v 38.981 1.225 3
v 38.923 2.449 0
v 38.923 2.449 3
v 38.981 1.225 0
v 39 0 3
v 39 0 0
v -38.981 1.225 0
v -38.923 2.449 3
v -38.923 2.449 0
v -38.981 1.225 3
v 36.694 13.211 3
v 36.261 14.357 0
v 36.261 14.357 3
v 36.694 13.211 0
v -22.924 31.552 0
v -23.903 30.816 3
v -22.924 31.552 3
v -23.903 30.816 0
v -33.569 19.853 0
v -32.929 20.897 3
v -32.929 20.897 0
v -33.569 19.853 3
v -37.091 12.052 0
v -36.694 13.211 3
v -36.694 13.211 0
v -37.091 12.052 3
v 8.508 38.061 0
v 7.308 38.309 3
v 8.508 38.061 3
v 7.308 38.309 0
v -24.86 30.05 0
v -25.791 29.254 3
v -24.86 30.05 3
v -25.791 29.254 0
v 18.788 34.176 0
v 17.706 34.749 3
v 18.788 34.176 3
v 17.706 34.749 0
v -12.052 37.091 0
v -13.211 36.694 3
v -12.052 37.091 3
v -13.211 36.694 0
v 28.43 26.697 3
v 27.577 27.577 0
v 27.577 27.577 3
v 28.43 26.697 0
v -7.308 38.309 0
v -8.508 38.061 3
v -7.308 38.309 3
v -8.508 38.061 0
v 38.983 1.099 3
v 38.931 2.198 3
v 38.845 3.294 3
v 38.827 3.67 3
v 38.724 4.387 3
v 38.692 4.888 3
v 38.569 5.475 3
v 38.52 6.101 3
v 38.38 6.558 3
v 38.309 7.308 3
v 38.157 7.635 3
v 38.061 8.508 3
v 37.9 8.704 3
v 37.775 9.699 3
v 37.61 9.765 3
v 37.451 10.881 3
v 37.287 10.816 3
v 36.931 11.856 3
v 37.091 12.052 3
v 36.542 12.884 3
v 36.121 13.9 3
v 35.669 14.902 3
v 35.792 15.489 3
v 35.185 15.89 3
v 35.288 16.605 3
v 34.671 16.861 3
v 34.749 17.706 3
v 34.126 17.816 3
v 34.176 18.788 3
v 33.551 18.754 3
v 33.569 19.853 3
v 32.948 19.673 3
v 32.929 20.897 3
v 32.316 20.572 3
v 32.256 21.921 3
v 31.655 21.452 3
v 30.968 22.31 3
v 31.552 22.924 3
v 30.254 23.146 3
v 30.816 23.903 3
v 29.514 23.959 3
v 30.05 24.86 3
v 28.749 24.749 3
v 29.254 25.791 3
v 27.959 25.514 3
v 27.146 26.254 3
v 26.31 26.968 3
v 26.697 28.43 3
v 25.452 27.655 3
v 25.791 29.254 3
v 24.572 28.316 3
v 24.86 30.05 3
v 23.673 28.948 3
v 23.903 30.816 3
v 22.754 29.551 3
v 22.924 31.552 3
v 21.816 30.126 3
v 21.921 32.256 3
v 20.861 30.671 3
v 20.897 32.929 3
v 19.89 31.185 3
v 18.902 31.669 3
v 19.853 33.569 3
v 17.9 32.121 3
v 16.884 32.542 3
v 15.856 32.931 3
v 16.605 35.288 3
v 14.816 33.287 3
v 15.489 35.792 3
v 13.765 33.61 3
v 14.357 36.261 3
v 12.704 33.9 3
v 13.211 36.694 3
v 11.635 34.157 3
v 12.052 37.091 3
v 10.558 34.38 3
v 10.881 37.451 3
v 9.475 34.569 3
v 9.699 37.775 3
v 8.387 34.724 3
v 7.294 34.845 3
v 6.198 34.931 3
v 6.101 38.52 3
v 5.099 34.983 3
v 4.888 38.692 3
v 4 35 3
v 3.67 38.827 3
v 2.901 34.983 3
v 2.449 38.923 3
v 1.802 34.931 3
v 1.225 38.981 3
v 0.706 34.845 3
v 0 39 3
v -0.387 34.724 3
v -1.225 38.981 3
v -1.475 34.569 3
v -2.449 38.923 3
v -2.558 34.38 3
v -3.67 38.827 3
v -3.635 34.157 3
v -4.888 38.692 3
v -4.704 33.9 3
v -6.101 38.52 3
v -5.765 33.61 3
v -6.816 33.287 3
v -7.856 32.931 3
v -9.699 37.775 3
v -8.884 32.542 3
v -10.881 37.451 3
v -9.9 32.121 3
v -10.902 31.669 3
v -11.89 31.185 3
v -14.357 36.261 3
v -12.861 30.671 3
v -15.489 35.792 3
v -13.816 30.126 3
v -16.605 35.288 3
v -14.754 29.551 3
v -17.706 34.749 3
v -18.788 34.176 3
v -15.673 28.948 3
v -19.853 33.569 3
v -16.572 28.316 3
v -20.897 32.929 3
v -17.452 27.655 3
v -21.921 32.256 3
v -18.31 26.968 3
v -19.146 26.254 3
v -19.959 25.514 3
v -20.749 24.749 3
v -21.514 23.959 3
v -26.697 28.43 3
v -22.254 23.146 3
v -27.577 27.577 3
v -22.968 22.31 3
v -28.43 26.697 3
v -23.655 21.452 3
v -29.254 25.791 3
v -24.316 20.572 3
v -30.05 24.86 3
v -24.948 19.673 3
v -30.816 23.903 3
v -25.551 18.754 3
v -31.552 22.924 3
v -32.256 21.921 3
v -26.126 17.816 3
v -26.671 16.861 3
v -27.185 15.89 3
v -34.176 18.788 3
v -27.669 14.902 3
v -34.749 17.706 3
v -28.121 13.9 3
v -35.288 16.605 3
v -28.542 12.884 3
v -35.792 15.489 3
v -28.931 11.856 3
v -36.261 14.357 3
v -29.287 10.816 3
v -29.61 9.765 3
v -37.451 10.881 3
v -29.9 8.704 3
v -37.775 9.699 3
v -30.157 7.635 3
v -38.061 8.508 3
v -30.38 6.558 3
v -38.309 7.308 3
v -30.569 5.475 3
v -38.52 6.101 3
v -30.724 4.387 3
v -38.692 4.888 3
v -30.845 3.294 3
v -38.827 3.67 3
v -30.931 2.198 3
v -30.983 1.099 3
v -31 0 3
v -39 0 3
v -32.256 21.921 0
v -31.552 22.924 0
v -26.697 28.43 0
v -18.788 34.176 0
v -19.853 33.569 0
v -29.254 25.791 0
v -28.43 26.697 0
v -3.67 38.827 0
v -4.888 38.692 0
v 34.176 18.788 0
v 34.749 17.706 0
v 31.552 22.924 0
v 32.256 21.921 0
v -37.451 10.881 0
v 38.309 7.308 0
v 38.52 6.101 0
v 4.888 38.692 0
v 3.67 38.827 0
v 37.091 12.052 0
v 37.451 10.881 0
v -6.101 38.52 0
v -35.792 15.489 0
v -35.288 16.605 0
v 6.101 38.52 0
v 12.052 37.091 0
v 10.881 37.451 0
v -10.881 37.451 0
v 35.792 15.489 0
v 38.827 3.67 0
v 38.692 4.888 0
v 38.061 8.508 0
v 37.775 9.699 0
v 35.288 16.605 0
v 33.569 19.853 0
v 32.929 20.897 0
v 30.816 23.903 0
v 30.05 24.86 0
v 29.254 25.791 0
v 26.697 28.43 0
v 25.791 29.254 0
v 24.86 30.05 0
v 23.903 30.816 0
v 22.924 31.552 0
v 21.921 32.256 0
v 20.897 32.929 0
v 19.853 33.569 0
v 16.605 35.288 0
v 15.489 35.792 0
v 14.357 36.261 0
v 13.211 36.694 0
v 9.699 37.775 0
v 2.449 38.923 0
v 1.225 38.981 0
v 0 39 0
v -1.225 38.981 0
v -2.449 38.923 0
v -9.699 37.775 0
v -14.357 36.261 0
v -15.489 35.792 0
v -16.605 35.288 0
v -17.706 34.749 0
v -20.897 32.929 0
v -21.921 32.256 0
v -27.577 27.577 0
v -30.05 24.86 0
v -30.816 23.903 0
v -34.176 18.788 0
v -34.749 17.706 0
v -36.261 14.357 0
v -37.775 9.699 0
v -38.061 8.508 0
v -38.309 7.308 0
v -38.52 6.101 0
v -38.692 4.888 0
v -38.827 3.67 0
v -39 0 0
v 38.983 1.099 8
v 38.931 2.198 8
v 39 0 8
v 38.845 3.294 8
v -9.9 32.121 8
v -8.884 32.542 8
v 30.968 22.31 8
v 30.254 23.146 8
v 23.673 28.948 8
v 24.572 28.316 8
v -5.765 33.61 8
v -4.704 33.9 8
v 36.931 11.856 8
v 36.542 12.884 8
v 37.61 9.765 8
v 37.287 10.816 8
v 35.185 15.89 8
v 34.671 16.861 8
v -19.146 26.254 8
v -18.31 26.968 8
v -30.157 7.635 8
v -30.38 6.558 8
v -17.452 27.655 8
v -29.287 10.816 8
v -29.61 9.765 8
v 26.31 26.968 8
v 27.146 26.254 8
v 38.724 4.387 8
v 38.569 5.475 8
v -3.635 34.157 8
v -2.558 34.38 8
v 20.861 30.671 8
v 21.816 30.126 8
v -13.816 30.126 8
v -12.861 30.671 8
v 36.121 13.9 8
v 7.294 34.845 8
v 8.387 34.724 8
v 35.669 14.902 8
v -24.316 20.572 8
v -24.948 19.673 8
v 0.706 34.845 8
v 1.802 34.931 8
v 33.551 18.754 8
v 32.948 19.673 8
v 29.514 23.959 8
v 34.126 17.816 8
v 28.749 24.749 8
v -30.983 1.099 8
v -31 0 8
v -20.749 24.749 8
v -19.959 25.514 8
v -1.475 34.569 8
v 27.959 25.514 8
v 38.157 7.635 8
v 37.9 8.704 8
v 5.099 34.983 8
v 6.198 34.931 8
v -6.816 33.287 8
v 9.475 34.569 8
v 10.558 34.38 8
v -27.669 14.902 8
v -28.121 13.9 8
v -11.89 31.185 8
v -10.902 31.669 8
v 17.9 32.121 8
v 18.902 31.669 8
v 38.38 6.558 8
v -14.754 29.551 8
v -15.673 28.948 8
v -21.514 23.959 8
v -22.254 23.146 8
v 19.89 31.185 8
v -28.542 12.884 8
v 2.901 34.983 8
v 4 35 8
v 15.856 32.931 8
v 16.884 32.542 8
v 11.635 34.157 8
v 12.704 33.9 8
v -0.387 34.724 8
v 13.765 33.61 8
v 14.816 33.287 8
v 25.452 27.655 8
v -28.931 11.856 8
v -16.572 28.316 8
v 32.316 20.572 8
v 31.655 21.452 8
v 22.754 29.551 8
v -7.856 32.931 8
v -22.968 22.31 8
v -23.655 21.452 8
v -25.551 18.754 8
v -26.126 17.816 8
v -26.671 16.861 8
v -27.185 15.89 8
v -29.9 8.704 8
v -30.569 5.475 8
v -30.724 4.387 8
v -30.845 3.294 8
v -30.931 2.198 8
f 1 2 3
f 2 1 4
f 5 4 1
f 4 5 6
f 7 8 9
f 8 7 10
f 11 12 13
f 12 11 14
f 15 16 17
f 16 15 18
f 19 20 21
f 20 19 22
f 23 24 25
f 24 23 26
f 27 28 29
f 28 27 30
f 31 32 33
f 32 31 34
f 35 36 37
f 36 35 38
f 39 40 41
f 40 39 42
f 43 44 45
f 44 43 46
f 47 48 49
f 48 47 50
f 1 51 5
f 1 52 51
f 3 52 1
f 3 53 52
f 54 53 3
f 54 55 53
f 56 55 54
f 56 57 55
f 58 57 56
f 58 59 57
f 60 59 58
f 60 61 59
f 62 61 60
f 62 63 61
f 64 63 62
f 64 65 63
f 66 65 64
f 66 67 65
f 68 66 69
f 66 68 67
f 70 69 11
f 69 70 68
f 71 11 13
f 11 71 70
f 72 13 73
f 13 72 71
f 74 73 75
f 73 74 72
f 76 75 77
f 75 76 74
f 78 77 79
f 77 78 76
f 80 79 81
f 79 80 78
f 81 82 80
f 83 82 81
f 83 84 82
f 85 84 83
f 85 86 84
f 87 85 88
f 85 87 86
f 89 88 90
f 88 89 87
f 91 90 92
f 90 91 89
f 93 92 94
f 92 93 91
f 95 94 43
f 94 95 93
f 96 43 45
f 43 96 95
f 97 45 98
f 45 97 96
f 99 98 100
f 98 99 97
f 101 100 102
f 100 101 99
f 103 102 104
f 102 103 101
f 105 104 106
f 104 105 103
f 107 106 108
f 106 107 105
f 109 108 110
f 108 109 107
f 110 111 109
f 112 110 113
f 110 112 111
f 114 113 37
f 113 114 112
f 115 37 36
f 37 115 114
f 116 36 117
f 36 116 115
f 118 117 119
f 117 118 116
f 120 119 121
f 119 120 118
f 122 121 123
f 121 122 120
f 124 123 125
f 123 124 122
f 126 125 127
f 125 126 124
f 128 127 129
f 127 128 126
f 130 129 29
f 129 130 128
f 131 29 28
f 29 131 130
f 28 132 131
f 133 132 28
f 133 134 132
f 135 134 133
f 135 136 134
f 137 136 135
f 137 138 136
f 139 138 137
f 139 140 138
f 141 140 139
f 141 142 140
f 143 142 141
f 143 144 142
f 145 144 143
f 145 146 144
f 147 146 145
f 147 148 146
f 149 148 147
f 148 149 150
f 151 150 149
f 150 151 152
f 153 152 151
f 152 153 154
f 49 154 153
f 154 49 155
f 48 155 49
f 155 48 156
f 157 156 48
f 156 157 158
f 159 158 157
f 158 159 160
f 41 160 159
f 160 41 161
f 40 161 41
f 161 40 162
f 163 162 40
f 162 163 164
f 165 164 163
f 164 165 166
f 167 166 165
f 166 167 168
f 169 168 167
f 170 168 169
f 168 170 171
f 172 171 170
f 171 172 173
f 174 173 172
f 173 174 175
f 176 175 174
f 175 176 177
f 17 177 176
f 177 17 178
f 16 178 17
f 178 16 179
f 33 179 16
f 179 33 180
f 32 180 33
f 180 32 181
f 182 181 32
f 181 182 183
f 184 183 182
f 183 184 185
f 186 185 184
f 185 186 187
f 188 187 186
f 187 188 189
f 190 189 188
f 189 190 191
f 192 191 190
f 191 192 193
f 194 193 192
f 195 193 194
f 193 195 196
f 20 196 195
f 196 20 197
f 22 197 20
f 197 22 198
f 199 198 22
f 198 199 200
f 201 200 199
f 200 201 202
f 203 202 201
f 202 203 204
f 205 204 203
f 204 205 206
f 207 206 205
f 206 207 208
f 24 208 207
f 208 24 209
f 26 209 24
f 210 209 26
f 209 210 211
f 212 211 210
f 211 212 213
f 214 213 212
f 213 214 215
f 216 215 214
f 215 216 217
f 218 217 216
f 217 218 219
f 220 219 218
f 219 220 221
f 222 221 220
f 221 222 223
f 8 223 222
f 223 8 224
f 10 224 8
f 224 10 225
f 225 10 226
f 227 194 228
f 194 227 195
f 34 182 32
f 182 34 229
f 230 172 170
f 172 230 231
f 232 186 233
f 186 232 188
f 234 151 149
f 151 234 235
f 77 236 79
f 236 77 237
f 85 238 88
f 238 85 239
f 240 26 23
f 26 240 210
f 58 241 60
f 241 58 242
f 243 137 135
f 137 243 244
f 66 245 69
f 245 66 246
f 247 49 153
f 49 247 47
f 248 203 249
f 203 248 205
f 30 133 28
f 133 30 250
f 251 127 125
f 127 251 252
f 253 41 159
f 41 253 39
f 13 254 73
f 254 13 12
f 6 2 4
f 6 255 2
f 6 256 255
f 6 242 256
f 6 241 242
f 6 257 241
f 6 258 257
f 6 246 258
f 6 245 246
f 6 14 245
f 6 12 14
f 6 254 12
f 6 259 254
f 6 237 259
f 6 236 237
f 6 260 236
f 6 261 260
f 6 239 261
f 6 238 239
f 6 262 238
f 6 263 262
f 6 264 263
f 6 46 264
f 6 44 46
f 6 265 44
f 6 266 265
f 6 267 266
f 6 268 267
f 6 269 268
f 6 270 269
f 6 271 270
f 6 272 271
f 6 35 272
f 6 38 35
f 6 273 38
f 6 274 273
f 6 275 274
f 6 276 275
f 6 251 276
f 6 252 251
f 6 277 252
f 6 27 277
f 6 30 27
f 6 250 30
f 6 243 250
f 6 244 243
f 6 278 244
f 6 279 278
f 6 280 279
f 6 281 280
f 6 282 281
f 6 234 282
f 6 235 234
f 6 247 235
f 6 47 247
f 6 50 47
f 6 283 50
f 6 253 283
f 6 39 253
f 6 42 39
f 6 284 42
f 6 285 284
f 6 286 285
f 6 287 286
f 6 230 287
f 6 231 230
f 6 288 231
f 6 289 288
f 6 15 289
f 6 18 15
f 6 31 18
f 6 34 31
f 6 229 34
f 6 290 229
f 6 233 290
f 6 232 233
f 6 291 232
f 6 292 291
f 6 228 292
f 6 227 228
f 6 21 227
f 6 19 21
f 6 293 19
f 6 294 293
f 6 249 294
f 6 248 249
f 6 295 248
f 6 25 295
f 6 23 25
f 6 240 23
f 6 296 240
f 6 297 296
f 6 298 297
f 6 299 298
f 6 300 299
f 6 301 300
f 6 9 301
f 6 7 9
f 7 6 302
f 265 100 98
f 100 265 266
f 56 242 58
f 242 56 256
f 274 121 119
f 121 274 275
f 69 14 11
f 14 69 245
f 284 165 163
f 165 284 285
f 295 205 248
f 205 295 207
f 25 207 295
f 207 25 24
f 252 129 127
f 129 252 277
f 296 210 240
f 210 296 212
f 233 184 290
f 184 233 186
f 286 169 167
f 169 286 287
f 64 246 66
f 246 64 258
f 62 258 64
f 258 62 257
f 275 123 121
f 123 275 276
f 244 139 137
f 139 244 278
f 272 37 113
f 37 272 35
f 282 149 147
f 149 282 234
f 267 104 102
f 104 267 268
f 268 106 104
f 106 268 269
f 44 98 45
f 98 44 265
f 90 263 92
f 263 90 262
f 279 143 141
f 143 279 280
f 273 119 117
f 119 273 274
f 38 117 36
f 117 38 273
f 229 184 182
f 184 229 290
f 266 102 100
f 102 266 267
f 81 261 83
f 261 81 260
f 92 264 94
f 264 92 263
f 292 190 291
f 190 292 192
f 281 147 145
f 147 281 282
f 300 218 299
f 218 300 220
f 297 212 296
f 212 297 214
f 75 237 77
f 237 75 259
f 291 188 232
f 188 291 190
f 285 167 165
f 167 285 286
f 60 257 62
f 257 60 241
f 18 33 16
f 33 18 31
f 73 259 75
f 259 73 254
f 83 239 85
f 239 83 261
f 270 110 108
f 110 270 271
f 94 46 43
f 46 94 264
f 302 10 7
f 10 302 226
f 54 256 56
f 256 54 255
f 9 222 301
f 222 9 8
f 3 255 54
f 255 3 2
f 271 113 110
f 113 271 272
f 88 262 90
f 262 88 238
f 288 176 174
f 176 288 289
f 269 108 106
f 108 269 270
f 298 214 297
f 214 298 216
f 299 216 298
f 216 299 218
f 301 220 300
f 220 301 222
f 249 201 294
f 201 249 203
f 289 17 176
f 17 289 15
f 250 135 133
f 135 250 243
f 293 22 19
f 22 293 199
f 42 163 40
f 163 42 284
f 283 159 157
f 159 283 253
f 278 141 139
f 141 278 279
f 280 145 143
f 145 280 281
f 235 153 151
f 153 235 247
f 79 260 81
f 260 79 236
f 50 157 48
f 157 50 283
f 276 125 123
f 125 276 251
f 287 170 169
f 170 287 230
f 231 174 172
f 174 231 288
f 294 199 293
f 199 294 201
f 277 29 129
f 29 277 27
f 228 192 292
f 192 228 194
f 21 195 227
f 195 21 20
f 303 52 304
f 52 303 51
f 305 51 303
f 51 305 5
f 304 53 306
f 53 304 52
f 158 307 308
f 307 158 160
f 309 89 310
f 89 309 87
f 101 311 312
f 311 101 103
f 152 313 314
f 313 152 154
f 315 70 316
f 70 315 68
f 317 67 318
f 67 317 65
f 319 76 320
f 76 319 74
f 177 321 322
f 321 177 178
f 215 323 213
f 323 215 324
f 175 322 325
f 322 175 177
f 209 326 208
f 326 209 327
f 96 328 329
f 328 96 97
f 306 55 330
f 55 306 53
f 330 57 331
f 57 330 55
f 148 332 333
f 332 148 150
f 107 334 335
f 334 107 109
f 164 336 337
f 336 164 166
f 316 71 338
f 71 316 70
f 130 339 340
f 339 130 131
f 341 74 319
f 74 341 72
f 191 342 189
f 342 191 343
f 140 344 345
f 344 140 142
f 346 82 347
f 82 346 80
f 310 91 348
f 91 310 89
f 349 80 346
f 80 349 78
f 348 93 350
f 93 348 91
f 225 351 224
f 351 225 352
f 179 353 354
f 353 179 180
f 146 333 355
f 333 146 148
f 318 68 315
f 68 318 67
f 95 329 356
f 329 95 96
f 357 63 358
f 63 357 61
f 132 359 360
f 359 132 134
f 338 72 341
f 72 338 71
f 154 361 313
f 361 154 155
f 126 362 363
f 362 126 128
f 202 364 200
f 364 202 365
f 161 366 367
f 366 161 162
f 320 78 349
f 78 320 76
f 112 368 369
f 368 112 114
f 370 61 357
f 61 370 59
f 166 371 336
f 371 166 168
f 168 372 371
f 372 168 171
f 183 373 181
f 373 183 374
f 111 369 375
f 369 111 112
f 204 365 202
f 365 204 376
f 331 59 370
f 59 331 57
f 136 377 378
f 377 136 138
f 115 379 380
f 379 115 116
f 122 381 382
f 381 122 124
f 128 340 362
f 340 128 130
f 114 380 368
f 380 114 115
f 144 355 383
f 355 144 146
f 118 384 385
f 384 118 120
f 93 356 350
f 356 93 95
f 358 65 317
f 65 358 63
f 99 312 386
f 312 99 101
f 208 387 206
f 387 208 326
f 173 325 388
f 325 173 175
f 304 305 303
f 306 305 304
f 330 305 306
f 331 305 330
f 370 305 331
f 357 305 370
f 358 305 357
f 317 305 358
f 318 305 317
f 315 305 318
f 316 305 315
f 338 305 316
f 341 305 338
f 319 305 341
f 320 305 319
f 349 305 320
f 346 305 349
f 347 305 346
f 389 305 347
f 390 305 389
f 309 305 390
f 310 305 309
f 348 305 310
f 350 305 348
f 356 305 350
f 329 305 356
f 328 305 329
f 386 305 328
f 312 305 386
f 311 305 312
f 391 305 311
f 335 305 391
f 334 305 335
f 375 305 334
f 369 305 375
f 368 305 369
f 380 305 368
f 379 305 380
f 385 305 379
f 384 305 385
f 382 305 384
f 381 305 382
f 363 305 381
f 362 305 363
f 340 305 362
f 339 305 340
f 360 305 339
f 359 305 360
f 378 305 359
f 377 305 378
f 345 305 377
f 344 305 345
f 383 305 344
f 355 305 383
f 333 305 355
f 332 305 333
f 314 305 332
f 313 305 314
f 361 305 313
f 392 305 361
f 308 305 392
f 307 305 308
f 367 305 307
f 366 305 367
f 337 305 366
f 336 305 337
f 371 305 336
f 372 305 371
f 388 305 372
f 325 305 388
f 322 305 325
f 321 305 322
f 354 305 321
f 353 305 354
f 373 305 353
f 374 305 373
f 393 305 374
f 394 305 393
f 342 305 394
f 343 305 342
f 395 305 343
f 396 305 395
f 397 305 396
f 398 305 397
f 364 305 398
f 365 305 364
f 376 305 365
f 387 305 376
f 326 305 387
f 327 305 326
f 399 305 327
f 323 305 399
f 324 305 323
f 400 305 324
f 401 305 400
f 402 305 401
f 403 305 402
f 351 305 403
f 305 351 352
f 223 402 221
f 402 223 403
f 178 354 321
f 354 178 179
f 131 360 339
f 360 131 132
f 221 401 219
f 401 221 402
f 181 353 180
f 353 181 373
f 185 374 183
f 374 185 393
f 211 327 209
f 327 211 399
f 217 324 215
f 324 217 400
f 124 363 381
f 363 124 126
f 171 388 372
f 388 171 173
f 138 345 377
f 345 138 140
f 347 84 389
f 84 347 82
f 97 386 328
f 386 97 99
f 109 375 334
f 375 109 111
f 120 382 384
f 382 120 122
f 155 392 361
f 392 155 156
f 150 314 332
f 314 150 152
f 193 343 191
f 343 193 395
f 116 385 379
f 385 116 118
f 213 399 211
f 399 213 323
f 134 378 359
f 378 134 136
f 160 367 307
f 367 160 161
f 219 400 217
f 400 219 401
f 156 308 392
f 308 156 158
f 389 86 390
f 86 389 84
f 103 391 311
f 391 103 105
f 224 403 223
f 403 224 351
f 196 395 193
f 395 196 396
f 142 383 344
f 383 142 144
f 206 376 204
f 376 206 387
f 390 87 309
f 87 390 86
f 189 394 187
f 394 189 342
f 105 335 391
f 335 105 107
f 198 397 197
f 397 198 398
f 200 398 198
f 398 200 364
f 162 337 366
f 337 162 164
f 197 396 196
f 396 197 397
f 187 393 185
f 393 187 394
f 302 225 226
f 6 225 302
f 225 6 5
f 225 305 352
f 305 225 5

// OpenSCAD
// 0 to 8mm depth
$fn=200;

difference(){
union(){
cylinder(d=78, h=3);
translate([4,0,0]) cylinder(d=70, h=8);
}
translate([-39,-39,0]) cube([78, 39, 8]);
}
